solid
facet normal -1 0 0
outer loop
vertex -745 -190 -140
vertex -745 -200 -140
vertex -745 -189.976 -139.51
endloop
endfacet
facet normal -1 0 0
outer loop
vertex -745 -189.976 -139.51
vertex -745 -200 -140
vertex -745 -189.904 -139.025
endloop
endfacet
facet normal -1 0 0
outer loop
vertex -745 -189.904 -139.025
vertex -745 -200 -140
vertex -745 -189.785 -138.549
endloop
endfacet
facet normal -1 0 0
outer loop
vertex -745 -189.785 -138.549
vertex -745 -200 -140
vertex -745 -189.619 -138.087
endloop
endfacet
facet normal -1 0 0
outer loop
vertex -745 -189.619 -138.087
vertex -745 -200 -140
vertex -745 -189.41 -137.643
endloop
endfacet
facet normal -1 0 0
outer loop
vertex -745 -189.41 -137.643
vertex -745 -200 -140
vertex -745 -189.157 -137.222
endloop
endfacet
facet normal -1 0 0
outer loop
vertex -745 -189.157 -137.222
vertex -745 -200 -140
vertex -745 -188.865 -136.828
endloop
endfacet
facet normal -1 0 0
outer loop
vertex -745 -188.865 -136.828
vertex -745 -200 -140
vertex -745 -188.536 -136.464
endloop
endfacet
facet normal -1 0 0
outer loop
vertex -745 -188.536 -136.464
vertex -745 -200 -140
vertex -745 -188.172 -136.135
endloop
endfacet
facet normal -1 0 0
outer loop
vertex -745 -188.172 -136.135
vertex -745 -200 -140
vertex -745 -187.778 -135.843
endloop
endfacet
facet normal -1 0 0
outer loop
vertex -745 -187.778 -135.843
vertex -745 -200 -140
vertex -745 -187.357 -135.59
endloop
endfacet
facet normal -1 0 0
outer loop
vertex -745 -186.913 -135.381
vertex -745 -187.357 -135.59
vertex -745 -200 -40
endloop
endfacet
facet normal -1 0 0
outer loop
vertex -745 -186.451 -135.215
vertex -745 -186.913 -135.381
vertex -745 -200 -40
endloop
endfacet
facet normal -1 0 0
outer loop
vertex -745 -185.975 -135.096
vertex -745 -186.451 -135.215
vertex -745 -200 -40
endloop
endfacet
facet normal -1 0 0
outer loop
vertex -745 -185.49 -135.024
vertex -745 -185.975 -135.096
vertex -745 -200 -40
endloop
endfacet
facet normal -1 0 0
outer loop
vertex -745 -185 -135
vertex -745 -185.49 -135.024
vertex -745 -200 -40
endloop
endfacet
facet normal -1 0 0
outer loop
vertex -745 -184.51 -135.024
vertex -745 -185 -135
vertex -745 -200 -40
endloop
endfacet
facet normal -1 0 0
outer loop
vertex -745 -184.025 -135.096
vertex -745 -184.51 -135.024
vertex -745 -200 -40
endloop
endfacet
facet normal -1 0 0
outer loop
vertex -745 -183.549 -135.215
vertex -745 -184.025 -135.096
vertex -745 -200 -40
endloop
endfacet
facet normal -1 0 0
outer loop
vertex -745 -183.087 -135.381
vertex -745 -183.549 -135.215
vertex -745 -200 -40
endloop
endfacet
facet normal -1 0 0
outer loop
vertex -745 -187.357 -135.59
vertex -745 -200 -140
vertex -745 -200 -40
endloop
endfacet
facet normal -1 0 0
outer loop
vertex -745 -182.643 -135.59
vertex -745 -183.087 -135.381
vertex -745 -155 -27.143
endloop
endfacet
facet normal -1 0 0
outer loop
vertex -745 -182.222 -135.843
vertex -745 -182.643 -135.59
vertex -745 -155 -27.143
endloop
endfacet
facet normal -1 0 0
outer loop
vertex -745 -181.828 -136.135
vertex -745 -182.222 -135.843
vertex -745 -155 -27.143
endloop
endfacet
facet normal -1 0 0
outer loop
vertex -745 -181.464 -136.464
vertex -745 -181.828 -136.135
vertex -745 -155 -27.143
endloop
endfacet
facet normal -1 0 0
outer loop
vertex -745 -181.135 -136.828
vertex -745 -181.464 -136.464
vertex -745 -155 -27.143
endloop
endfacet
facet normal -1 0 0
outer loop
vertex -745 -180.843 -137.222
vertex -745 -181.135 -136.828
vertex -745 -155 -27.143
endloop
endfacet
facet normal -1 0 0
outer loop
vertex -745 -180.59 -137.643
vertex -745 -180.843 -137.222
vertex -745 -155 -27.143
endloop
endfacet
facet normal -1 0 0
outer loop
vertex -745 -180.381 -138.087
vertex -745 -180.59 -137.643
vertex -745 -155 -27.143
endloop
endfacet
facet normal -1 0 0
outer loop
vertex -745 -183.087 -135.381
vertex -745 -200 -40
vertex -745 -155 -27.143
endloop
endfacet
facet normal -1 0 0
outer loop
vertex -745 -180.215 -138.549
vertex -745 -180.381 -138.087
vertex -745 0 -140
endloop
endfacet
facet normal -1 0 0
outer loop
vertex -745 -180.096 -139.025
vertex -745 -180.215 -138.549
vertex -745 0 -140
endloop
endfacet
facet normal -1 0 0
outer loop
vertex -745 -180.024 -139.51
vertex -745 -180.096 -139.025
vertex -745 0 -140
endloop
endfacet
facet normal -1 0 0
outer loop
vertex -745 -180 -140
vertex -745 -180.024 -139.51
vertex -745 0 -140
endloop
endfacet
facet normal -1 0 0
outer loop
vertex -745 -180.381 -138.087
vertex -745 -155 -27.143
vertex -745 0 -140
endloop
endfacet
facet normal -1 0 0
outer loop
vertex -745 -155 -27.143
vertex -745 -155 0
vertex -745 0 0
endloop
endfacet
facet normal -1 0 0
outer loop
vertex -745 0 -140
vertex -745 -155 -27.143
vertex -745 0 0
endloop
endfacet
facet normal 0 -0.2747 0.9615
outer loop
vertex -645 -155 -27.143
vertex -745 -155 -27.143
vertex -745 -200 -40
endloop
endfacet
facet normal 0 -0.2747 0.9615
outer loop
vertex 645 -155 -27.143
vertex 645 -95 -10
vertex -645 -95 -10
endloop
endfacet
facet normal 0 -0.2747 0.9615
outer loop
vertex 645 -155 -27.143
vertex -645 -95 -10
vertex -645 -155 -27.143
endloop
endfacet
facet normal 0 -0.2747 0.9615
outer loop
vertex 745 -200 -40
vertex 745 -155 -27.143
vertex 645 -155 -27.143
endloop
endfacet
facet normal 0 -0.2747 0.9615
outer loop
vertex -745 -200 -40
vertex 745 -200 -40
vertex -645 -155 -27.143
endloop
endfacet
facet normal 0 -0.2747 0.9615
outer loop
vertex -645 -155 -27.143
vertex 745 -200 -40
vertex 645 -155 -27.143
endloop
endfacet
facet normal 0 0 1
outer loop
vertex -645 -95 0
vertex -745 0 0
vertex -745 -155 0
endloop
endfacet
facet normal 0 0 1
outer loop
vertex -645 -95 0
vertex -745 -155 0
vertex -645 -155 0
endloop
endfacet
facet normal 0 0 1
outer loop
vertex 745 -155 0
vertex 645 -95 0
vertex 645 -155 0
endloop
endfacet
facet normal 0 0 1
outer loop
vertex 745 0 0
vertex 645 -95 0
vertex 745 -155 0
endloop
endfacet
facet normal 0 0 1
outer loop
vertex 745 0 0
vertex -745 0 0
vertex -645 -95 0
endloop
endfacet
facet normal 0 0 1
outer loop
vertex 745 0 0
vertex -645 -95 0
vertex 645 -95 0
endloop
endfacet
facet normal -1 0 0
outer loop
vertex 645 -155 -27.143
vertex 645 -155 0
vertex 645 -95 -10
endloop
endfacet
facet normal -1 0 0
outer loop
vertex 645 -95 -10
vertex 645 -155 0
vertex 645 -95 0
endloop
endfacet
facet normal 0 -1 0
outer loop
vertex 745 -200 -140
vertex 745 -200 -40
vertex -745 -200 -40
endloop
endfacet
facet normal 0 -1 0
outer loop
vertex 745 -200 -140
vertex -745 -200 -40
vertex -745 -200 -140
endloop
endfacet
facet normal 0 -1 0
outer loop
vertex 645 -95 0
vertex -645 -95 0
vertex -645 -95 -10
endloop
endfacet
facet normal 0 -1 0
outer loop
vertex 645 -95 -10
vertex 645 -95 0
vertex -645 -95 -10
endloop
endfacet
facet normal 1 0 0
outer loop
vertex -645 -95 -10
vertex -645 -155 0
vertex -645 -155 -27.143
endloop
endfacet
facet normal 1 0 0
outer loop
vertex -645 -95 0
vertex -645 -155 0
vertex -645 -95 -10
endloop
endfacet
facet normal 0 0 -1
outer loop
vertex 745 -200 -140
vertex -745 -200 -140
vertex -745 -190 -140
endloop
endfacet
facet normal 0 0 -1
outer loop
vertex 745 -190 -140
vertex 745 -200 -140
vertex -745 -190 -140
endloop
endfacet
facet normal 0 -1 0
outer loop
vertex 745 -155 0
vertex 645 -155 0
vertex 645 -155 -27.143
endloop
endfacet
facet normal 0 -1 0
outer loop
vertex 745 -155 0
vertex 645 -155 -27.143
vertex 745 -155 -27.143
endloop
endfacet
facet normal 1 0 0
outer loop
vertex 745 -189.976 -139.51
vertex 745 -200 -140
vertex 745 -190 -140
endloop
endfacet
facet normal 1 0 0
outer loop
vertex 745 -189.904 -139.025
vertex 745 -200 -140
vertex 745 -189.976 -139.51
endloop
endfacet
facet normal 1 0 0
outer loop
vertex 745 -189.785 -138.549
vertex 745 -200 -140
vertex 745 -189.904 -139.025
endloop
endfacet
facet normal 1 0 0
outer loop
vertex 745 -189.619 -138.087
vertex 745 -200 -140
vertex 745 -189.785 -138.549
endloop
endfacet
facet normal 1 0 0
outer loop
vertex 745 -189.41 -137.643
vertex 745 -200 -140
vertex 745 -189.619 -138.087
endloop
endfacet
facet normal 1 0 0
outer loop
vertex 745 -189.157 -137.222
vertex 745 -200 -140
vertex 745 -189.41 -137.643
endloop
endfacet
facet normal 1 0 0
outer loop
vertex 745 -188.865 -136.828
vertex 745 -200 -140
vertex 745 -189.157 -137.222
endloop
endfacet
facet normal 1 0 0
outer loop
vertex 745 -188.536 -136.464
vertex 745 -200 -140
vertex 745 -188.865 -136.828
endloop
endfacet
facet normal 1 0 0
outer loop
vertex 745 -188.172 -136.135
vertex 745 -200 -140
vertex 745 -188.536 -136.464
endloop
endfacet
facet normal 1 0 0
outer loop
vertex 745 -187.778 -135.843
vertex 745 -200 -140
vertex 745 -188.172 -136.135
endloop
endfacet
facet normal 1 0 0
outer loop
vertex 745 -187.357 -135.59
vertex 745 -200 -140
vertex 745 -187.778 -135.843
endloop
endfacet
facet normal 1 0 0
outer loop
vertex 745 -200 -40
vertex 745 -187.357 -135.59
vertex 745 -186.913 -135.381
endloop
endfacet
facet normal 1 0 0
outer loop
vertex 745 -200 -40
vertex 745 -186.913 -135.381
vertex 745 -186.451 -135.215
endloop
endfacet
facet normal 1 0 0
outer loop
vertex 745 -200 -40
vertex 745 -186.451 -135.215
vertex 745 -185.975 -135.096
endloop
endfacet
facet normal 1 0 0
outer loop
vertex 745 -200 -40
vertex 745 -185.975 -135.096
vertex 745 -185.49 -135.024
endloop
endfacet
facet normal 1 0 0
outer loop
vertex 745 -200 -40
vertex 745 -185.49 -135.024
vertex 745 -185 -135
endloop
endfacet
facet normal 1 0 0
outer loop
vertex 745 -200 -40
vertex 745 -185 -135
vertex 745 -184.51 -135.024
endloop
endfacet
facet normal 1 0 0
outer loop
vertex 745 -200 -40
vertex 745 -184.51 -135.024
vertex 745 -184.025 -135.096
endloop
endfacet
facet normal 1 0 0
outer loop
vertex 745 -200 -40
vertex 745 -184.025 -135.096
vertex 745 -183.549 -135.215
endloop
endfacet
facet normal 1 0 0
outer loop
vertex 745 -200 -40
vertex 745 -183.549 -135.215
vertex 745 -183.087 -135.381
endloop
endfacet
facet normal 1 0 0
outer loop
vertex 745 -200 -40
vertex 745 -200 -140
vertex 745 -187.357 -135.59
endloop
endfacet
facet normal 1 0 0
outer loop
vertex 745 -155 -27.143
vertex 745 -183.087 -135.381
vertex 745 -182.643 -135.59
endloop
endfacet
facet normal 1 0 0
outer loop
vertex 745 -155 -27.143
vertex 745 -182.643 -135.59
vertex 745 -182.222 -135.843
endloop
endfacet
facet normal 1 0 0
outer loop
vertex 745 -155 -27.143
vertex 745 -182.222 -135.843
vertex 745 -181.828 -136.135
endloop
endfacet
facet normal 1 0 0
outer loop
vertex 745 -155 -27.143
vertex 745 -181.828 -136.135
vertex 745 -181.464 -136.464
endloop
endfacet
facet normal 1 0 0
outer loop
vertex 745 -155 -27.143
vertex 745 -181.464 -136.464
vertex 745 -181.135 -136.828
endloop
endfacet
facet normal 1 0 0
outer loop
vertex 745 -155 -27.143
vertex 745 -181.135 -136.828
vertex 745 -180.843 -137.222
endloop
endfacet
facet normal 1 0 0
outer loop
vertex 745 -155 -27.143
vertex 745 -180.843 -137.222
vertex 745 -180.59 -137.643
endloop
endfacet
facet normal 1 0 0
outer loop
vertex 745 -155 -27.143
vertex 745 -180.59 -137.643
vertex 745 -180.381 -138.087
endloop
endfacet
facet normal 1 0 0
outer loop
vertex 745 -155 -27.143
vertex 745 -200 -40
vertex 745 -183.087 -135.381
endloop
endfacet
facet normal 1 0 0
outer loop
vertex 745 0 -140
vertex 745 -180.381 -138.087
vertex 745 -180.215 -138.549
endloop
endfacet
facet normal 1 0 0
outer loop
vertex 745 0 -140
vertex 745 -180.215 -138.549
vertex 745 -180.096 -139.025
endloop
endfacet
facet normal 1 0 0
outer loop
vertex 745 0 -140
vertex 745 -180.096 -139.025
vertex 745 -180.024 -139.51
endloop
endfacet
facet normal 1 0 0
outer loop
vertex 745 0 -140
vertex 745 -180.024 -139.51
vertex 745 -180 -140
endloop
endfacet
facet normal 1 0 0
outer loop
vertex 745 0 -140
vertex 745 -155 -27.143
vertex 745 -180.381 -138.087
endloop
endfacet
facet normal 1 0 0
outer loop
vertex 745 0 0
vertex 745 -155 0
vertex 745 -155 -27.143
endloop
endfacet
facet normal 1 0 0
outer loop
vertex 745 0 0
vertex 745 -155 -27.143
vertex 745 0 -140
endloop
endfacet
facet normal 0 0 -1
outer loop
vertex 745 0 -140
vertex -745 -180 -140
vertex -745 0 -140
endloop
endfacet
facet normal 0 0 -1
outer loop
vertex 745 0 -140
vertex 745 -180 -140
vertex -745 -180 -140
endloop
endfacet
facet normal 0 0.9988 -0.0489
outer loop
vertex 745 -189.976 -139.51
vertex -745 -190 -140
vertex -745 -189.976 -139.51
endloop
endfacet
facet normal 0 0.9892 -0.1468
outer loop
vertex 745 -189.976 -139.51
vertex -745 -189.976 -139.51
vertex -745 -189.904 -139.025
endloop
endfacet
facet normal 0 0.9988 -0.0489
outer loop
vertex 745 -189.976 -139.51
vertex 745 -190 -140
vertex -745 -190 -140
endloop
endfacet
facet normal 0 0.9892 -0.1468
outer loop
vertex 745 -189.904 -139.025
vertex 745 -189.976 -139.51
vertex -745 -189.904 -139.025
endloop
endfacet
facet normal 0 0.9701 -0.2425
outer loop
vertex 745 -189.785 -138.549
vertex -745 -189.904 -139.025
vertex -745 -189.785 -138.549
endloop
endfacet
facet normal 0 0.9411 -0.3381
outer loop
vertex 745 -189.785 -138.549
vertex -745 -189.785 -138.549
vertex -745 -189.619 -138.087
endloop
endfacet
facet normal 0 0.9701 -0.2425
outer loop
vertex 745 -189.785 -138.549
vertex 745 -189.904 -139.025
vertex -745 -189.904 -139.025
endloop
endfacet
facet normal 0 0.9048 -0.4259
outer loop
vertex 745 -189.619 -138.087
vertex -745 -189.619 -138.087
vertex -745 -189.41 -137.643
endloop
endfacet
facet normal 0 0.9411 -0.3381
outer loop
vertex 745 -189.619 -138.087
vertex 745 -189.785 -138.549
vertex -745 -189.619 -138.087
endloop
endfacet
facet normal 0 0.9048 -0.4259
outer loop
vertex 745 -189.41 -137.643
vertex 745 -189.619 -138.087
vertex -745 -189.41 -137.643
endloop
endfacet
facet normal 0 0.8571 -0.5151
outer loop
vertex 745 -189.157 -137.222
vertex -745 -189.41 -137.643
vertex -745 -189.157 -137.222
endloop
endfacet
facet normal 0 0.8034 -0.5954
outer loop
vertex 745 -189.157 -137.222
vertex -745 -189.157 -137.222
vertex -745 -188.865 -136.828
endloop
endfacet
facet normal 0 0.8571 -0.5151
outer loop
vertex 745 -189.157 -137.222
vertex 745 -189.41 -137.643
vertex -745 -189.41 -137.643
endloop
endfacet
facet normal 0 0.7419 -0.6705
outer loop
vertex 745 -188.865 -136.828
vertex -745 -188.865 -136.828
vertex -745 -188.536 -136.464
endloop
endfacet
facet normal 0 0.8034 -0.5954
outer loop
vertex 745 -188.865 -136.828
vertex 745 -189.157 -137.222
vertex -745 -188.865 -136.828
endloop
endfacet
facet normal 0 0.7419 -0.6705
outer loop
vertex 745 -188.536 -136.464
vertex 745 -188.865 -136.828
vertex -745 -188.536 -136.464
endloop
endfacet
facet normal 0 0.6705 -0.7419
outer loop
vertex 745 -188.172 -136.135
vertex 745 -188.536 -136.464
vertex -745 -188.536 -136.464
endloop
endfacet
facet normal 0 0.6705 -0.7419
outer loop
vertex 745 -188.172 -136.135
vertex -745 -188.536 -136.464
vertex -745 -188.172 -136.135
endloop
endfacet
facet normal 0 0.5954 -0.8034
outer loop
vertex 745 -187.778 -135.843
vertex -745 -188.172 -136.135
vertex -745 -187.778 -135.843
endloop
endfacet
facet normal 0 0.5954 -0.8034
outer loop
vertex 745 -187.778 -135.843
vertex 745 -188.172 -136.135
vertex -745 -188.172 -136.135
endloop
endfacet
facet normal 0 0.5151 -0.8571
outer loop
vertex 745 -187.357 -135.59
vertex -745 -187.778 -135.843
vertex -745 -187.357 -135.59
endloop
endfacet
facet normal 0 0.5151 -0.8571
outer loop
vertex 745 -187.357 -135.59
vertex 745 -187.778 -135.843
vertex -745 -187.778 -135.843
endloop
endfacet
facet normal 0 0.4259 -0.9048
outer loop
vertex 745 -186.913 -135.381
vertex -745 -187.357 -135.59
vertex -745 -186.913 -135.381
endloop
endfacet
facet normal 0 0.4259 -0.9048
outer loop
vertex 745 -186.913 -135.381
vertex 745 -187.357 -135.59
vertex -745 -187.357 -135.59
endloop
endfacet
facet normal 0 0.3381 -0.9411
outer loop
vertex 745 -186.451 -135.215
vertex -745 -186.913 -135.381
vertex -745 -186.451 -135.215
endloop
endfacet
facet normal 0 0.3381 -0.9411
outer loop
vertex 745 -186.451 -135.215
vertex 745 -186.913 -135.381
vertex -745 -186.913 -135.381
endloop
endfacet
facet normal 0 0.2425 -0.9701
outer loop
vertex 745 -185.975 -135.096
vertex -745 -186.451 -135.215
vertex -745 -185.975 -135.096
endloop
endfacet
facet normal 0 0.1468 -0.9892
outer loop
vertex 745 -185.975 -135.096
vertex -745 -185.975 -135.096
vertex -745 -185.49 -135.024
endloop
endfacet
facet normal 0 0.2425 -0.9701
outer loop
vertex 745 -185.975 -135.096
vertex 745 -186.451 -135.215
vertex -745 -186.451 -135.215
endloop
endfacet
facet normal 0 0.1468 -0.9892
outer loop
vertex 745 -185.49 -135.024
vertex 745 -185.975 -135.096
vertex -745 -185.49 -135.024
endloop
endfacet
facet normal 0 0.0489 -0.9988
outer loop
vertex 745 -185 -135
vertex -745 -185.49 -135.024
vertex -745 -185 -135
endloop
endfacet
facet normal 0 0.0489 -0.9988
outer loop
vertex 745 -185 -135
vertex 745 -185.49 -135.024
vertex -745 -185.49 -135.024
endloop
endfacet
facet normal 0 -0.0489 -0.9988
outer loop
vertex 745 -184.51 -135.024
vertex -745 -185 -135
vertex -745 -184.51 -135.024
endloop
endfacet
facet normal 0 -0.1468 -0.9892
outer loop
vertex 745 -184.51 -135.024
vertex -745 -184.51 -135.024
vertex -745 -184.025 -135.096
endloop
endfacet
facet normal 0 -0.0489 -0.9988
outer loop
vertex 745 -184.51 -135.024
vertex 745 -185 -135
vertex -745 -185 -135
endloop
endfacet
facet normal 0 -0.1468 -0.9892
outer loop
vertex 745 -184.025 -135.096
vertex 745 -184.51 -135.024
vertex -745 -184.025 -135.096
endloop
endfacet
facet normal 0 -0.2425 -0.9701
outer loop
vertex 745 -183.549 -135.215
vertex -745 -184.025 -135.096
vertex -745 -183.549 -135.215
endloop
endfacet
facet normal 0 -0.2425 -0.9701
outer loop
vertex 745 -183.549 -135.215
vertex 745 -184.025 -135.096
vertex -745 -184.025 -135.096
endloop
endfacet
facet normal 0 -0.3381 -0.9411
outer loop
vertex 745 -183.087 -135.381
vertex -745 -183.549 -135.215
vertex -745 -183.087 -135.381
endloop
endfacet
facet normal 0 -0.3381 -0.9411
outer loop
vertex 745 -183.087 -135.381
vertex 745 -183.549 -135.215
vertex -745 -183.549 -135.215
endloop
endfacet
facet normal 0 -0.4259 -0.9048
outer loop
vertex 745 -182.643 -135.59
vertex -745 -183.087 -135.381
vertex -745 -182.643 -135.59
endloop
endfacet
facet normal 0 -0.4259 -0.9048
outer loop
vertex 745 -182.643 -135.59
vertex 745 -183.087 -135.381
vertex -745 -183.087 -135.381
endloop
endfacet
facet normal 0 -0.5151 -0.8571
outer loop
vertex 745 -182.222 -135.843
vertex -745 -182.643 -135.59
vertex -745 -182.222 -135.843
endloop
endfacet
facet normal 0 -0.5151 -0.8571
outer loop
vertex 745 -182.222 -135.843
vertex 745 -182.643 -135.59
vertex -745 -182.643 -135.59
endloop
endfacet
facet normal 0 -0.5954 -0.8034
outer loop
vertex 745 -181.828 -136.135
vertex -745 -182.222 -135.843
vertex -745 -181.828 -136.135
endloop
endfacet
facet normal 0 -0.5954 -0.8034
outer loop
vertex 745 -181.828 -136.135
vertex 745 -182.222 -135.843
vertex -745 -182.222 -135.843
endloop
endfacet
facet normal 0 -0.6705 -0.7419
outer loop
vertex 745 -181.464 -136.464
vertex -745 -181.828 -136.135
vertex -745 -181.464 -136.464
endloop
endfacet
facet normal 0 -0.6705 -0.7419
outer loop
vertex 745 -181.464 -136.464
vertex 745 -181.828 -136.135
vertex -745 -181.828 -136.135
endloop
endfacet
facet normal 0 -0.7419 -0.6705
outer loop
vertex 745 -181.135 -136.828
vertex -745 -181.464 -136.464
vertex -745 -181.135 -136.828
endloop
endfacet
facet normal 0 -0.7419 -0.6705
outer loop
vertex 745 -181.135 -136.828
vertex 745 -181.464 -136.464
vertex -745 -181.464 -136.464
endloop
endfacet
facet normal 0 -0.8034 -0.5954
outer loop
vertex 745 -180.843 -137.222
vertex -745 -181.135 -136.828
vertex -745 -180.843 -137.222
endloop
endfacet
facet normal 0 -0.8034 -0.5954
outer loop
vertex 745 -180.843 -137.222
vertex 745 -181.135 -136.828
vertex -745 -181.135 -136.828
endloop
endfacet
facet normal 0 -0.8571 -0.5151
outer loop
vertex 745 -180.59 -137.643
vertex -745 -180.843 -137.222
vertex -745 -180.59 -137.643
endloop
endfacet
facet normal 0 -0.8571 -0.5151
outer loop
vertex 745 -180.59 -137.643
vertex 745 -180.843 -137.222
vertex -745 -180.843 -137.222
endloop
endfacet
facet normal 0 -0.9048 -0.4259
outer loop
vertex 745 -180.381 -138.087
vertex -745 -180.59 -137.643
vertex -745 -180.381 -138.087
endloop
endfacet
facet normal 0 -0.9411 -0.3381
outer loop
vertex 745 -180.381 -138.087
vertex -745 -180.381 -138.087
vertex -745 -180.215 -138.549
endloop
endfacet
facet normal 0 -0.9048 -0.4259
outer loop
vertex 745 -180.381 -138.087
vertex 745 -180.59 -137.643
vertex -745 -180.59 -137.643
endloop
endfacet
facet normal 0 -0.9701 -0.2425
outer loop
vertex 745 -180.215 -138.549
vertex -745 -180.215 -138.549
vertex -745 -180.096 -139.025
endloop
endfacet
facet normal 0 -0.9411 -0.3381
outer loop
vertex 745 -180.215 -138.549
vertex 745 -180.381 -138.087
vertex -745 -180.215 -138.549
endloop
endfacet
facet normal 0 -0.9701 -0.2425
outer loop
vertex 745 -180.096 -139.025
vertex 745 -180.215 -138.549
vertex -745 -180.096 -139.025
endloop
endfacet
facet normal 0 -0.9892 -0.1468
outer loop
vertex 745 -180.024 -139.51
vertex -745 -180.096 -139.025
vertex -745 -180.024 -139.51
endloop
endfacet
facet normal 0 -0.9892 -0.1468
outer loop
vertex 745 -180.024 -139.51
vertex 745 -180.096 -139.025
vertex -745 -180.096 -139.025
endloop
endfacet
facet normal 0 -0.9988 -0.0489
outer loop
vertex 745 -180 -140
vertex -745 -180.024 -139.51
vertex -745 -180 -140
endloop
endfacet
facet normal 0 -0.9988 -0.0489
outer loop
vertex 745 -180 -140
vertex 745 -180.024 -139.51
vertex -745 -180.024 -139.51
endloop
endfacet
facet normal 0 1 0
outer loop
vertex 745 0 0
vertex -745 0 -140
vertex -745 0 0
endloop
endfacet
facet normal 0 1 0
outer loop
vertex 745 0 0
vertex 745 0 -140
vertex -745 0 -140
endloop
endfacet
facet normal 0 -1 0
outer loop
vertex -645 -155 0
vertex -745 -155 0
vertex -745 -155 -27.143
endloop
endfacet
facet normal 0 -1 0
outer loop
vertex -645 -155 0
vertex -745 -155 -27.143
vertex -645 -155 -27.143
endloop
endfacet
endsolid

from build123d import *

# Parameters (mm, degrees)
F1_DEPTH = 745
F2_W     = 100
F2_H     = 60
F4_W     = 100
F4_H     = 60


with BuildPart() as f1:
    # F0 (on Right) → F1 (new body, symmetric)
    with BuildSketch(Plane.YZ):
        with BuildLine():
            Line((0, -140), (0, 0))
            Line((0, 0), (-95, 0))
            Line((-95, 0), (-95, -10))
            Line((-95, -10), (-200, -40))
            Line((-200, -40), (-200, -140))
            Line((-200, -140), (-190, -140))
            ThreePointArc((-190, -140), (-185, -135), (-180, -140))
            Line((-180, -140), (0, -140))
        make_face()
    extrude(amount=F1_DEPTH, both=True)

    # F2 (on face) → F3 (join, up to the next surface of F1)
    with BuildSketch(Plane.XY):
        with Locations((-695, -125)):
            Rectangle(F2_W, F2_H)
    extrude(until=Until.NEXT, dir=(0, 0, -1))

    # F4 (on face) → F5 (join, up to the next surface of F1)
    with BuildSketch(Plane.XY):
        with Locations((695, -125)):
            Rectangle(F4_W, F4_H)
    extrude(until=Until.NEXT, dir=(0, 0, -1))


solid = f1.part
